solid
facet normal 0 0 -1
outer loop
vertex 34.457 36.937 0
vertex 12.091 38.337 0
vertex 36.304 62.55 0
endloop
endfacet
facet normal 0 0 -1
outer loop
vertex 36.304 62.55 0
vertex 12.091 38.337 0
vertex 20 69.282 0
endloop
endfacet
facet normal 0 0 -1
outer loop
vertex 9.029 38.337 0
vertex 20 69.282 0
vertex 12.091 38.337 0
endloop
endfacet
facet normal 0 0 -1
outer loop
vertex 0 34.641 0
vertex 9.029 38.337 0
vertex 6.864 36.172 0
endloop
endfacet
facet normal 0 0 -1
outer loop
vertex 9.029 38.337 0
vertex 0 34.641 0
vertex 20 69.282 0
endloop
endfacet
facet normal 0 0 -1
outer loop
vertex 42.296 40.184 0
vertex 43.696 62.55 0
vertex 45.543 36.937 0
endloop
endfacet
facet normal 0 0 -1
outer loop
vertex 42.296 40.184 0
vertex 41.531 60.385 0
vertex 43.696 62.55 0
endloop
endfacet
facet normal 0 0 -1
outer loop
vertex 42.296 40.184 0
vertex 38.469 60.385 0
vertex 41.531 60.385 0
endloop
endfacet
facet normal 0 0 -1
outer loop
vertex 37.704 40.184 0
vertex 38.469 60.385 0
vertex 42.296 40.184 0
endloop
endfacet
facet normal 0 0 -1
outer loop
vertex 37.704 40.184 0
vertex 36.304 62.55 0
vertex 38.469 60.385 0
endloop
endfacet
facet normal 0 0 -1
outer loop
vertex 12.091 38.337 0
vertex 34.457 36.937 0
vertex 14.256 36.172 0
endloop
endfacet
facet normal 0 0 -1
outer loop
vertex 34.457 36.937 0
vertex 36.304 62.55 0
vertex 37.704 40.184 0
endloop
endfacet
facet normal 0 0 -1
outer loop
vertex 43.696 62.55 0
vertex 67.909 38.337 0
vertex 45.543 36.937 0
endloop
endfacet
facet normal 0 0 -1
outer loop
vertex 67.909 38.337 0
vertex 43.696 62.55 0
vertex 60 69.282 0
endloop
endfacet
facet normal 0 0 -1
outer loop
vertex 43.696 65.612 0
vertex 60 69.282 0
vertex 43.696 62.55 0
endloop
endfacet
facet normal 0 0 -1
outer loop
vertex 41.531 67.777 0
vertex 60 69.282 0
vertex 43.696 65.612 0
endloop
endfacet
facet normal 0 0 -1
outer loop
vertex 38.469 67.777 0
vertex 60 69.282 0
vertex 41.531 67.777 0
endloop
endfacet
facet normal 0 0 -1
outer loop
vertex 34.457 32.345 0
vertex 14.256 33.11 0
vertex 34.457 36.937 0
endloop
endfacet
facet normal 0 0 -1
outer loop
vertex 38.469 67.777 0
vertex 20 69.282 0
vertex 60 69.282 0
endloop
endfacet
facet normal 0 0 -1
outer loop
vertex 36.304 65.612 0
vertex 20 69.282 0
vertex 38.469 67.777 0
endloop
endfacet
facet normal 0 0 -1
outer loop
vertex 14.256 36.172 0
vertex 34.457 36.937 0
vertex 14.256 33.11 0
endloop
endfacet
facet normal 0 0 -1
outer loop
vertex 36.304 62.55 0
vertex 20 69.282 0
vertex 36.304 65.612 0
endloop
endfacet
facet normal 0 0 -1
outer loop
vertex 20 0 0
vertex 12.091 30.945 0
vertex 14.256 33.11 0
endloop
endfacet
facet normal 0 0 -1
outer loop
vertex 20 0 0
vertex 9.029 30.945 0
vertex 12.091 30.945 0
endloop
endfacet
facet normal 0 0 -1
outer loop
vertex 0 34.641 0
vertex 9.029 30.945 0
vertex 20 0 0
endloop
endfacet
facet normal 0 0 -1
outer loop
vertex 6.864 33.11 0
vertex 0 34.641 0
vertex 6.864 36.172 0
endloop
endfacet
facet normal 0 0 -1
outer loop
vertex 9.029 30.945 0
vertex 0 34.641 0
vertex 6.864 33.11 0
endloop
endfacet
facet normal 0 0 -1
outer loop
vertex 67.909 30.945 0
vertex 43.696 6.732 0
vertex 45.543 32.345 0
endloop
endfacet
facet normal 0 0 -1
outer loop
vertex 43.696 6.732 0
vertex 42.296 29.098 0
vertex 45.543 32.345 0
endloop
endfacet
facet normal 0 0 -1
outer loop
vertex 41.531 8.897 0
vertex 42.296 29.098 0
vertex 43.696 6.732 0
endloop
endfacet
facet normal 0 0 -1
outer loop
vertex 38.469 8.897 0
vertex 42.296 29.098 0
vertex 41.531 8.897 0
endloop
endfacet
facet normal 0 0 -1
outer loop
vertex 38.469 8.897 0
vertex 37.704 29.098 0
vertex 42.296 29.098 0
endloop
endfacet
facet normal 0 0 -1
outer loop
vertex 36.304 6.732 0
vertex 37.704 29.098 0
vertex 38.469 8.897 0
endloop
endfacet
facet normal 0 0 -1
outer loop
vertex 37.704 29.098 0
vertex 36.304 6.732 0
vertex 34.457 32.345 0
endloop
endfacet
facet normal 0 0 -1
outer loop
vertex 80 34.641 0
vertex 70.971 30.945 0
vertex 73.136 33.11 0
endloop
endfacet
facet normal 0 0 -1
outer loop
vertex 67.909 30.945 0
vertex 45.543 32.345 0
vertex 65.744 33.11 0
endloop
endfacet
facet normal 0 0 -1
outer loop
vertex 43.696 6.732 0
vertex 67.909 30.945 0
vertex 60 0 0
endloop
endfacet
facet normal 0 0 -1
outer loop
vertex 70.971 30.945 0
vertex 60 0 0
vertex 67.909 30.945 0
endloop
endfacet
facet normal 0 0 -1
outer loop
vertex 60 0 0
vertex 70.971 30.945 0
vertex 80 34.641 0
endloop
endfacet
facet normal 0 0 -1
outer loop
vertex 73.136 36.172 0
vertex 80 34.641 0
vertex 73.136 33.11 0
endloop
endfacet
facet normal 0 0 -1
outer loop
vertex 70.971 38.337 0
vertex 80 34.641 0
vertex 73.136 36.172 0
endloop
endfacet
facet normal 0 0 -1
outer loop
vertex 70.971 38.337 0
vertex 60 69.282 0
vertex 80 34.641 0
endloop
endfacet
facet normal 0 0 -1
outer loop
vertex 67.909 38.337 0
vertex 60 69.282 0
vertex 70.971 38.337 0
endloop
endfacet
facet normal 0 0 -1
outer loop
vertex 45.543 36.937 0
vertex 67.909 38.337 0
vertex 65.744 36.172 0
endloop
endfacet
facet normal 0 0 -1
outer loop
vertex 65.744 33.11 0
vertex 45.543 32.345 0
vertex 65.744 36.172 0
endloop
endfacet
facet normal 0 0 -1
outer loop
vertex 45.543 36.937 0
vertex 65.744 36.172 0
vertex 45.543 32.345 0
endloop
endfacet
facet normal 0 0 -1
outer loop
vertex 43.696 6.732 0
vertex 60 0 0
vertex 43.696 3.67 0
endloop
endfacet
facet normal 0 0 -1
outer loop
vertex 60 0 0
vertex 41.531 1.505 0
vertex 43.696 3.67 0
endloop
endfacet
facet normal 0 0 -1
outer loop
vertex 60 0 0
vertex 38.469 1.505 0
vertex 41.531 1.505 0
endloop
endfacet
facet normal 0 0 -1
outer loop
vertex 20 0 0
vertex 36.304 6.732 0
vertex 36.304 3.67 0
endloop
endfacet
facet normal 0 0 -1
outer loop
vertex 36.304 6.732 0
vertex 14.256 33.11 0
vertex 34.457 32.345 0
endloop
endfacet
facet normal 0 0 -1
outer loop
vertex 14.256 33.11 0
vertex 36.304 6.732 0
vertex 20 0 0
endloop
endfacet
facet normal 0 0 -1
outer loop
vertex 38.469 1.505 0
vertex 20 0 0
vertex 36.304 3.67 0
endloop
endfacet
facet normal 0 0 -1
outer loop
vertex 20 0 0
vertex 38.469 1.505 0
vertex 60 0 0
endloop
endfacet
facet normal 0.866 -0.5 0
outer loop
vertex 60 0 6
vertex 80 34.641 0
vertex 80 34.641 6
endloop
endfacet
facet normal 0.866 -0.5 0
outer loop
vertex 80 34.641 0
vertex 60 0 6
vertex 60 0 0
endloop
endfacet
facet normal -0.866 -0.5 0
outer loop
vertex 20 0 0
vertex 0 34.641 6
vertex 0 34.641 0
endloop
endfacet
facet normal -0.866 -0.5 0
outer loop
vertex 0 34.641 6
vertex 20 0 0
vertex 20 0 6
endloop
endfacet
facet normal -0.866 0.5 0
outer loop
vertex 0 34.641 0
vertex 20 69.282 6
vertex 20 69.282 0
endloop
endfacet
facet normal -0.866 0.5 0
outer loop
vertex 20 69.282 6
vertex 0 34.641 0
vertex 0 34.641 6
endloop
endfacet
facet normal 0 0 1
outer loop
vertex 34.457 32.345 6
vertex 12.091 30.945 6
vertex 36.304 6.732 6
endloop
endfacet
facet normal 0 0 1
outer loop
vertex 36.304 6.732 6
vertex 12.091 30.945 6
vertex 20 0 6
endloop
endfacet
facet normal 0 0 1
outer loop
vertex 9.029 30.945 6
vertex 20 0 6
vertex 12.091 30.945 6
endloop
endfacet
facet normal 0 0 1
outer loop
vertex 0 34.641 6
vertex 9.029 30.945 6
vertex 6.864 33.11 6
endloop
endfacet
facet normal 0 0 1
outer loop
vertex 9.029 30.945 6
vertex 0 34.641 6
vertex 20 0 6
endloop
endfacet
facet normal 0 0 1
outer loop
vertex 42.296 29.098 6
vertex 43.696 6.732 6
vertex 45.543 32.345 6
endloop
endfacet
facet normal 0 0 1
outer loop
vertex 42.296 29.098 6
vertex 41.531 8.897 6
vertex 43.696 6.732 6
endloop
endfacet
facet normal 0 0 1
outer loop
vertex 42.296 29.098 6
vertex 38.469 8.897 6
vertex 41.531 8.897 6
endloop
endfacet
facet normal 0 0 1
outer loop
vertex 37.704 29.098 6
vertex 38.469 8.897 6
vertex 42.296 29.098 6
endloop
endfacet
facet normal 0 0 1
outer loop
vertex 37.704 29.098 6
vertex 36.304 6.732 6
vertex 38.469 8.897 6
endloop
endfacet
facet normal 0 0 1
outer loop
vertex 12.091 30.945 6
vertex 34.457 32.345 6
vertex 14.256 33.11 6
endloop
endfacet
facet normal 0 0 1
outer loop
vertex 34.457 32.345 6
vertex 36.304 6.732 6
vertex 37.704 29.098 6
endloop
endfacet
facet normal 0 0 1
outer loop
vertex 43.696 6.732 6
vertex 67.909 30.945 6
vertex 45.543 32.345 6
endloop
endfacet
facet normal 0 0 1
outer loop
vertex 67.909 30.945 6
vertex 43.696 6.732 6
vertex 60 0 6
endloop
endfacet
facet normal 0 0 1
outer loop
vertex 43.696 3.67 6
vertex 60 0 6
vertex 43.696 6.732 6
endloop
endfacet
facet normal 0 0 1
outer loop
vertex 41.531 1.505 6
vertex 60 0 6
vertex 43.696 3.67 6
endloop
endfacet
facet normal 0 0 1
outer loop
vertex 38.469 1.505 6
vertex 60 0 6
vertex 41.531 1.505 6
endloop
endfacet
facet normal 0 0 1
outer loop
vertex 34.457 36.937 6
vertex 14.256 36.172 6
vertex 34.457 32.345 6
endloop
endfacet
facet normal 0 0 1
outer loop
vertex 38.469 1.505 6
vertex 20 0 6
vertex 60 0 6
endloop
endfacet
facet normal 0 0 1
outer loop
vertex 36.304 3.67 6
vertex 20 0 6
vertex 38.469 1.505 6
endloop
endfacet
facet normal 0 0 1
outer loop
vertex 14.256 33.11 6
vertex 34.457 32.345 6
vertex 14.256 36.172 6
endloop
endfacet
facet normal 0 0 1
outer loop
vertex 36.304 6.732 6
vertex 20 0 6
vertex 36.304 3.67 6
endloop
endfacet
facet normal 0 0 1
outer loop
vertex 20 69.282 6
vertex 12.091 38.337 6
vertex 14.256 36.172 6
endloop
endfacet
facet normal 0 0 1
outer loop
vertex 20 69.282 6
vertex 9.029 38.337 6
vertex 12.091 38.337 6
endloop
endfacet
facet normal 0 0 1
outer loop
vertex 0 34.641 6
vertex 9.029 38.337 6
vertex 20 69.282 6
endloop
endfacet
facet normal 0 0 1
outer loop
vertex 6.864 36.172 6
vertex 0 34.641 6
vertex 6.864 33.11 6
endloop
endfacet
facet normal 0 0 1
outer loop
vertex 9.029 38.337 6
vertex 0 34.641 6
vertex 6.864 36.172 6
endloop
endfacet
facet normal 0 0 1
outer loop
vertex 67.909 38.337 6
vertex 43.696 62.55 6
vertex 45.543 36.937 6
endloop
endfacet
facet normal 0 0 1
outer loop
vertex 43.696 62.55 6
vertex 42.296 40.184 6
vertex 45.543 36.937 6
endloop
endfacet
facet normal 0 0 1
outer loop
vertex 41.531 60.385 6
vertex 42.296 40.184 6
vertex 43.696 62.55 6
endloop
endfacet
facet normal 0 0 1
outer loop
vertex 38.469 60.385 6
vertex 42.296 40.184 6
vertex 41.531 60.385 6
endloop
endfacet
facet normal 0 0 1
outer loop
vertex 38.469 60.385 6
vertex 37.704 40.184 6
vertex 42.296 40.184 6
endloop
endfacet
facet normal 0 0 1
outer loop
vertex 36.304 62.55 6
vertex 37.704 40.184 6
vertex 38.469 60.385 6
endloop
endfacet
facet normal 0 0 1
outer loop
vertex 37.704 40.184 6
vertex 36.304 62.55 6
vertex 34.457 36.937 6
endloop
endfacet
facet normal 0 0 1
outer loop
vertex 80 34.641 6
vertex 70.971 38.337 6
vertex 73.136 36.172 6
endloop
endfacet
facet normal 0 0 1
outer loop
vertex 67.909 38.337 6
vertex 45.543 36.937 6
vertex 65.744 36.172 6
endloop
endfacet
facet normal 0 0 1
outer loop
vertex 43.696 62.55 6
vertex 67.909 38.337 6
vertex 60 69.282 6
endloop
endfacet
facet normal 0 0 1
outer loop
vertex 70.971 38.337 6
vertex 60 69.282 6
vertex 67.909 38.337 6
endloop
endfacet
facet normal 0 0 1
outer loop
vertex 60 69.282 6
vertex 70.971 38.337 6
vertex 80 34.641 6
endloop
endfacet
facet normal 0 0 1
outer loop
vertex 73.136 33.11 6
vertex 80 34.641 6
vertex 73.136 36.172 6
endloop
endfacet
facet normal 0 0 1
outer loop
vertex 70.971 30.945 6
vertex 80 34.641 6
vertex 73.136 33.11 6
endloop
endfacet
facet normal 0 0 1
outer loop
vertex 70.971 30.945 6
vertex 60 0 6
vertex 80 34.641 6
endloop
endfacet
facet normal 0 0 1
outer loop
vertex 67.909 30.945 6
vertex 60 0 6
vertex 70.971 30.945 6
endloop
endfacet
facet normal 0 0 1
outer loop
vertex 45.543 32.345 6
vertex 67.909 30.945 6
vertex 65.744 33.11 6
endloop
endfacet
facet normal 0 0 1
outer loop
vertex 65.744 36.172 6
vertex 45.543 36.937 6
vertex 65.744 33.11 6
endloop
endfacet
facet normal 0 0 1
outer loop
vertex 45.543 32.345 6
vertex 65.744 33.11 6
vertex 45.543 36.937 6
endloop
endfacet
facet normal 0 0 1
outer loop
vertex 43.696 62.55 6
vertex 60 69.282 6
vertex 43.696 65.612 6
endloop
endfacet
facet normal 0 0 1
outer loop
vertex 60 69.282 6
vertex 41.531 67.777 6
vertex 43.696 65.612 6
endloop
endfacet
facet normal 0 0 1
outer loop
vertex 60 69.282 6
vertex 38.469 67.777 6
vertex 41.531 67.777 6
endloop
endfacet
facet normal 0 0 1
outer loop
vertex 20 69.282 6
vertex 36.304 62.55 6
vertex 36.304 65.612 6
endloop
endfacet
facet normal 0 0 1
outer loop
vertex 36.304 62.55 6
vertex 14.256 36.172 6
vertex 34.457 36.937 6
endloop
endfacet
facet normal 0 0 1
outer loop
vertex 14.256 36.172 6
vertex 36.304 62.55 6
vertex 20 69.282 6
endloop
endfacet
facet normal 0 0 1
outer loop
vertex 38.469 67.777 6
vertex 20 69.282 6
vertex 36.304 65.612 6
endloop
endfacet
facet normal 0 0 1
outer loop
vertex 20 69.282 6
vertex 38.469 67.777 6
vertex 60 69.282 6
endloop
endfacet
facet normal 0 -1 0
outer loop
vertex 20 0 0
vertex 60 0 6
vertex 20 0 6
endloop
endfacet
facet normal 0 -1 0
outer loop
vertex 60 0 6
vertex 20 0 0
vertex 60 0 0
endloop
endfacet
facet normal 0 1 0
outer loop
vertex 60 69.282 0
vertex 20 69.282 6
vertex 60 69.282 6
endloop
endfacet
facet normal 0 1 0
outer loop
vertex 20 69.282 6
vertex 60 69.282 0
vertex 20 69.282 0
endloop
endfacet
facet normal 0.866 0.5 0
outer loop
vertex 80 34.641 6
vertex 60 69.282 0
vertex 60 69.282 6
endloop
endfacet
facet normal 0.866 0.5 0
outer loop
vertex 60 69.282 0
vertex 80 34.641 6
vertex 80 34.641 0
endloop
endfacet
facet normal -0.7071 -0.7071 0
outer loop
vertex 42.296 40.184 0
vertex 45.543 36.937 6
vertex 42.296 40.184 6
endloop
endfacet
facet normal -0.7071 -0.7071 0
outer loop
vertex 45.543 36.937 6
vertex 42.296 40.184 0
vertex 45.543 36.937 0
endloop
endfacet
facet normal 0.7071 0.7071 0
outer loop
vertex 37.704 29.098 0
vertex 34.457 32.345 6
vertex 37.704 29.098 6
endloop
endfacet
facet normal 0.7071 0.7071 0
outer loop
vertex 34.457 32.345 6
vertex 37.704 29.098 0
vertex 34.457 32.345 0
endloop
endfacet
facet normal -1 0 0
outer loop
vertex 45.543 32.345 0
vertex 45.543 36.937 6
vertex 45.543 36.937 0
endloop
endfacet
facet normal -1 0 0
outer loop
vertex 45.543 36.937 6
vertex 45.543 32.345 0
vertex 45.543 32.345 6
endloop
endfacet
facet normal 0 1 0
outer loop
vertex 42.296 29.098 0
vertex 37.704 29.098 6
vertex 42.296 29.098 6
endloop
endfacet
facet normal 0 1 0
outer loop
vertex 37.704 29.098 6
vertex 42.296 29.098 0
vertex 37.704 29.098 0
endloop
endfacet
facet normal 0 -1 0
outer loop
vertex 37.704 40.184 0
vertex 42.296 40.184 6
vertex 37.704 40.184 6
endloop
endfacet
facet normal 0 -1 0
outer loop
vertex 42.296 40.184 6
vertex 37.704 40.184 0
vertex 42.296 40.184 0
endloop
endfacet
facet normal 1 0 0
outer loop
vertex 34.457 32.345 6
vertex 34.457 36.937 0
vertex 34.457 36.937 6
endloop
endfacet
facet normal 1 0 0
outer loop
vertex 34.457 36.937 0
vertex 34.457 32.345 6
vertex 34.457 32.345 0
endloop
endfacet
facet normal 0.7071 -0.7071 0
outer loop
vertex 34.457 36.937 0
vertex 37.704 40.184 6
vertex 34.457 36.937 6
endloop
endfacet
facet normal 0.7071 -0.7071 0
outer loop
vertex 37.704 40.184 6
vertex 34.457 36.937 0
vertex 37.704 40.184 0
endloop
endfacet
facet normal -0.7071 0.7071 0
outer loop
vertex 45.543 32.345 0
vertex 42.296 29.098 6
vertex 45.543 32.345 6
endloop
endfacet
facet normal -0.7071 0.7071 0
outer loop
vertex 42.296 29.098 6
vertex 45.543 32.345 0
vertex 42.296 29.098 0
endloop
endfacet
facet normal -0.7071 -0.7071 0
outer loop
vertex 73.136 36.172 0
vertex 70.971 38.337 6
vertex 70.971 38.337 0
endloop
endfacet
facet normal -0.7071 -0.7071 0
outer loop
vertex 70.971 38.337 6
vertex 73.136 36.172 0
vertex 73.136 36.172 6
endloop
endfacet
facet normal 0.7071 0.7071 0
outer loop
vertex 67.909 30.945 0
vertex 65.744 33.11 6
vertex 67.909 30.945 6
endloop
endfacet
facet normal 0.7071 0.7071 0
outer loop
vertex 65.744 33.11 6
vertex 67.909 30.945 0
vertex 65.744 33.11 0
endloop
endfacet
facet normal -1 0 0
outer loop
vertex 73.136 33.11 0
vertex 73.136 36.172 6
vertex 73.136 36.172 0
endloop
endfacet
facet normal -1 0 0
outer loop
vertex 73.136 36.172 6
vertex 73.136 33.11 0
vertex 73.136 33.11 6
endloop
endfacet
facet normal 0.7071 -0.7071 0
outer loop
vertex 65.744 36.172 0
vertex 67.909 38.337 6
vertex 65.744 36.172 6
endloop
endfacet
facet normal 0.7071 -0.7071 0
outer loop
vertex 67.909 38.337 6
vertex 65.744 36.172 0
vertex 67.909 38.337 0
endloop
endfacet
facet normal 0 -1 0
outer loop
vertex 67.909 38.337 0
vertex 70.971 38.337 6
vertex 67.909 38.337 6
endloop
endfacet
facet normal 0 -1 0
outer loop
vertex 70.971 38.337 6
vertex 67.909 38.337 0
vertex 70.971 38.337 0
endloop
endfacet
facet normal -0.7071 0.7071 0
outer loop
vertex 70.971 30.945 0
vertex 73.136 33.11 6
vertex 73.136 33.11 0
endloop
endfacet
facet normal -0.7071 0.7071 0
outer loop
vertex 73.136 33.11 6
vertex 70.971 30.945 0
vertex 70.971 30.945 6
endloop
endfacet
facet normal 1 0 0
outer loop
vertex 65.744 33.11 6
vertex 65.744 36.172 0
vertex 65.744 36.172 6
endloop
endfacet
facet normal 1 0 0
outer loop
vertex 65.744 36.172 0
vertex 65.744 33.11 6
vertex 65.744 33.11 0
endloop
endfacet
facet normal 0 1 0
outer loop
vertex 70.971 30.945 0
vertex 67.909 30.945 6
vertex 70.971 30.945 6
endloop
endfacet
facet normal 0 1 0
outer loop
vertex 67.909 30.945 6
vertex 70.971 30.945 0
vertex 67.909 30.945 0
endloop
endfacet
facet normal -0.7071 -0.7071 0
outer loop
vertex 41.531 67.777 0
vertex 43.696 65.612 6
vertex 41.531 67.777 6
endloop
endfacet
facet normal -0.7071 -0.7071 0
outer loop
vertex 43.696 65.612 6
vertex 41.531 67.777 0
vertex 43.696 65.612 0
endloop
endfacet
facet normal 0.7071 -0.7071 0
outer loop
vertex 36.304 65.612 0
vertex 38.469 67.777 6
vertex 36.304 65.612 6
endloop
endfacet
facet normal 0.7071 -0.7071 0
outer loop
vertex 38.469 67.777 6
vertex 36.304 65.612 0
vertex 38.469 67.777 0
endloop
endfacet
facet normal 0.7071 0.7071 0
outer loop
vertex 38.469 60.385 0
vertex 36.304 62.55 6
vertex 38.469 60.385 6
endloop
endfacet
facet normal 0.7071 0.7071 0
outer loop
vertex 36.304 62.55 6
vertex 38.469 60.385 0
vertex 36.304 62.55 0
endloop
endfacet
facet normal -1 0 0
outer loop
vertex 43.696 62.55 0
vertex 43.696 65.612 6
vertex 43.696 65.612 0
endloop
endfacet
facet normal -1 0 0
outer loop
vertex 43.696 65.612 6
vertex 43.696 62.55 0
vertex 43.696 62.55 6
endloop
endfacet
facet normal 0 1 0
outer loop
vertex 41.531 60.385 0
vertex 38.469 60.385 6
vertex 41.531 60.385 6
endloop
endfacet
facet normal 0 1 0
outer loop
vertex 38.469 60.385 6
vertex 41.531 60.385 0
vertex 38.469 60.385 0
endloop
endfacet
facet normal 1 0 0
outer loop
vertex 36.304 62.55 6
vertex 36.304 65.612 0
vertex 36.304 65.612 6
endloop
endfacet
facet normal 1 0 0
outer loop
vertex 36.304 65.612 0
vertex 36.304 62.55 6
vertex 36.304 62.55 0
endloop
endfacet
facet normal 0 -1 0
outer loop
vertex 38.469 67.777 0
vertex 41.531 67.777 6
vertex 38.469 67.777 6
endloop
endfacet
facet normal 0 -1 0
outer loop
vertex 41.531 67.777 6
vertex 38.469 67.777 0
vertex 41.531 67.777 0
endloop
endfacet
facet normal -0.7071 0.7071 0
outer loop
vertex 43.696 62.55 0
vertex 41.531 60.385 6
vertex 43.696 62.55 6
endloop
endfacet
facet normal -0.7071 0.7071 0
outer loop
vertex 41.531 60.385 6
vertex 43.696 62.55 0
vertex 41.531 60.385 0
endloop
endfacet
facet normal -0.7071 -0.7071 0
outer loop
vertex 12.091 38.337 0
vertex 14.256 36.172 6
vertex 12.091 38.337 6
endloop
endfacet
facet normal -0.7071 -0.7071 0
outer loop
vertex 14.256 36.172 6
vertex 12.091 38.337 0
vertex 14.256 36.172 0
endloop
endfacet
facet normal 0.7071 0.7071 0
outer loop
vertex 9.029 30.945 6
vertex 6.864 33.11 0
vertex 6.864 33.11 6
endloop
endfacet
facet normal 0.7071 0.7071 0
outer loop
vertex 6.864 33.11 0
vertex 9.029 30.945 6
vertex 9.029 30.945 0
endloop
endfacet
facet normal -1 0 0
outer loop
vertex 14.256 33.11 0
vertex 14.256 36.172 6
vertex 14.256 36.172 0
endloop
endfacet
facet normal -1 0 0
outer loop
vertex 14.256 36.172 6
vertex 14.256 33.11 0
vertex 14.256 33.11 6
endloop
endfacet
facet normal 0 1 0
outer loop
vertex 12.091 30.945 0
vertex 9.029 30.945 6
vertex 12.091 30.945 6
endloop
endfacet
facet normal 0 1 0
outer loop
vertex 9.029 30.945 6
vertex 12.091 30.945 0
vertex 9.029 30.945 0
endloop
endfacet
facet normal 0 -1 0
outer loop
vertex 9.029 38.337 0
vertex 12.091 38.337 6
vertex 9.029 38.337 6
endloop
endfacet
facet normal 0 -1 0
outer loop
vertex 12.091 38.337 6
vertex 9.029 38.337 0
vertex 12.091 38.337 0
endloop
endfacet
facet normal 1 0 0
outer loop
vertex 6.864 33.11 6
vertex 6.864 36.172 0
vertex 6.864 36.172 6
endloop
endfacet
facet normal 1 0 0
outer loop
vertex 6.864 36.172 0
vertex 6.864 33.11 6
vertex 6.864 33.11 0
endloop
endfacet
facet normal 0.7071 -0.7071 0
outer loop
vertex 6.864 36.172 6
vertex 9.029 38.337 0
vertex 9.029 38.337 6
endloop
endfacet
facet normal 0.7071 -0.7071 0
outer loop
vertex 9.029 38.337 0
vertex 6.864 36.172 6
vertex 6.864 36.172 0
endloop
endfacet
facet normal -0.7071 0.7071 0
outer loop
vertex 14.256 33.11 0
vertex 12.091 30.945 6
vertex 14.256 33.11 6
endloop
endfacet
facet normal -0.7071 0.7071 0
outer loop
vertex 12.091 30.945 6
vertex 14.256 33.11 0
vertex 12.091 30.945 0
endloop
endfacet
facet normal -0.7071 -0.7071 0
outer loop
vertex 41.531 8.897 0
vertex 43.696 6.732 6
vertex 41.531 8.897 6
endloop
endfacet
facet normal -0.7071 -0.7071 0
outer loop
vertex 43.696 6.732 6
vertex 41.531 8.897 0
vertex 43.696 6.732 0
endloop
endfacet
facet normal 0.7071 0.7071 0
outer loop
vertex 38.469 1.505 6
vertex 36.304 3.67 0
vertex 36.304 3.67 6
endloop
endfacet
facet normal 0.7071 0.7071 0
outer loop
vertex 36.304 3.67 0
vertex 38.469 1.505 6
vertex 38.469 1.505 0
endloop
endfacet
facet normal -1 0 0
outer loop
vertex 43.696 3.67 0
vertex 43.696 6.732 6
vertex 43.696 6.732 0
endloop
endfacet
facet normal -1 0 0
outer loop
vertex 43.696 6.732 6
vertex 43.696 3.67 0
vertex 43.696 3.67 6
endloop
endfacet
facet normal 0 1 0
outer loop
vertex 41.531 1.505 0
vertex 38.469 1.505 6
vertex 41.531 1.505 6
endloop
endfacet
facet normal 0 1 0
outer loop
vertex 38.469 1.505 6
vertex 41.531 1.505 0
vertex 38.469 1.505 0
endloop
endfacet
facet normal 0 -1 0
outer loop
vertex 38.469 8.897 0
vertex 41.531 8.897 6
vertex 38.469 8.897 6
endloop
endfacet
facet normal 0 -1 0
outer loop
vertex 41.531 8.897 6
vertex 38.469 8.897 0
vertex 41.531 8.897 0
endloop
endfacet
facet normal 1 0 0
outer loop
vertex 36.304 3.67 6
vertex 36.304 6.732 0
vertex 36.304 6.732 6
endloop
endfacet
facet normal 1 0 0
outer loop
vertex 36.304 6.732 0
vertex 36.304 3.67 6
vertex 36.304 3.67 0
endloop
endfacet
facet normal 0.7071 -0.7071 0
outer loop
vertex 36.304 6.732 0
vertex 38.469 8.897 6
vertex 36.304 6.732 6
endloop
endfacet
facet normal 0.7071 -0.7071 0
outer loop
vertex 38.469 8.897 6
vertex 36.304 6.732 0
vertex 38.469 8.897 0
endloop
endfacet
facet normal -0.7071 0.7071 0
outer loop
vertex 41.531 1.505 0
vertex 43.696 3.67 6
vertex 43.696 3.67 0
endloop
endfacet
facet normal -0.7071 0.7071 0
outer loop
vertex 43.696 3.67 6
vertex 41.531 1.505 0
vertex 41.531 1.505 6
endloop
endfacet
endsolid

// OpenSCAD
$fn = 32;

// ----------------------------------------------------------------------
// Polygon plate: 6-gon R40, 4 bolt windows
// ----------------------------------------------------------------------

// --- parameters (mm) ---
sides = 6;                // number of polygon sides
plate_r = 40;             // circumscribed radius of the polygon
bore_r = 6;               // centre bore radius
bolts = 4;                // number of bolt windows
ring_r = 29.44;           // bolt-circle radius
bolt_r = 4;               // bolt window radius
plate_t = 6;              // plate thickness, Z (extrusion height)

plate_d = 2 * plate_r;  // circumscribed diameter
bore_d = 2 * bore_r;  // centre bore diameter
bolt_d = 2 * bolt_r;  // bolt window diameter
ring_d = 2 * ring_r;  // bolt-circle diameter

profile = [[80, 34.641], [60, 69.282], [20, 69.282], [0, 34.641], [20, 0], [60, 0]];  // primary outline, 6 points, counter clockwise
void_1 = [[45.543, 36.937], [42.296, 40.184], [37.704, 40.184], [34.457, 36.937], [34.457, 32.345], [37.704, 29.098], [42.296, 29.098], [45.543, 32.345]];  // centre bore, 8 points
void_2 = [[73.136, 36.172], [70.971, 38.337], [67.909, 38.337], [65.744, 36.172], [65.744, 33.11], [67.909, 30.945], [70.971, 30.945], [73.136, 33.11]];  // bolt window 1, 8 points
void_3 = [[43.696, 65.612], [41.531, 67.777], [38.469, 67.777], [36.304, 65.612], [36.304, 62.55], [38.469, 60.385], [41.531, 60.385], [43.696, 62.55]];  // bolt window 2, 8 points
void_4 = [[14.256, 36.172], [12.091, 38.337], [9.029, 38.337], [6.864, 36.172], [6.864, 33.11], [9.029, 30.945], [12.091, 30.945], [14.256, 33.11]];  // bolt window 3, 8 points
void_5 = [[43.696, 6.732], [41.531, 8.897], [38.469, 8.897], [36.304, 6.732], [36.304, 3.67], [38.469, 1.505], [41.531, 1.505], [43.696, 3.67]];  // bolt window 4, 8 points

// --- the one profile operation ---
difference() {
  linear_extrude(height = plate_t) polygon(points = profile);
  translate([0, 0, -1])
    linear_extrude(height = plate_t + 2) polygon(points = void_1);
  translate([0, 0, -1])
    linear_extrude(height = plate_t + 2) polygon(points = void_2);
  translate([0, 0, -1])
    linear_extrude(height = plate_t + 2) polygon(points = void_3);
  translate([0, 0, -1])
    linear_extrude(height = plate_t + 2) polygon(points = void_4);
  translate([0, 0, -1])
    linear_extrude(height = plate_t + 2) polygon(points = void_5);
}
